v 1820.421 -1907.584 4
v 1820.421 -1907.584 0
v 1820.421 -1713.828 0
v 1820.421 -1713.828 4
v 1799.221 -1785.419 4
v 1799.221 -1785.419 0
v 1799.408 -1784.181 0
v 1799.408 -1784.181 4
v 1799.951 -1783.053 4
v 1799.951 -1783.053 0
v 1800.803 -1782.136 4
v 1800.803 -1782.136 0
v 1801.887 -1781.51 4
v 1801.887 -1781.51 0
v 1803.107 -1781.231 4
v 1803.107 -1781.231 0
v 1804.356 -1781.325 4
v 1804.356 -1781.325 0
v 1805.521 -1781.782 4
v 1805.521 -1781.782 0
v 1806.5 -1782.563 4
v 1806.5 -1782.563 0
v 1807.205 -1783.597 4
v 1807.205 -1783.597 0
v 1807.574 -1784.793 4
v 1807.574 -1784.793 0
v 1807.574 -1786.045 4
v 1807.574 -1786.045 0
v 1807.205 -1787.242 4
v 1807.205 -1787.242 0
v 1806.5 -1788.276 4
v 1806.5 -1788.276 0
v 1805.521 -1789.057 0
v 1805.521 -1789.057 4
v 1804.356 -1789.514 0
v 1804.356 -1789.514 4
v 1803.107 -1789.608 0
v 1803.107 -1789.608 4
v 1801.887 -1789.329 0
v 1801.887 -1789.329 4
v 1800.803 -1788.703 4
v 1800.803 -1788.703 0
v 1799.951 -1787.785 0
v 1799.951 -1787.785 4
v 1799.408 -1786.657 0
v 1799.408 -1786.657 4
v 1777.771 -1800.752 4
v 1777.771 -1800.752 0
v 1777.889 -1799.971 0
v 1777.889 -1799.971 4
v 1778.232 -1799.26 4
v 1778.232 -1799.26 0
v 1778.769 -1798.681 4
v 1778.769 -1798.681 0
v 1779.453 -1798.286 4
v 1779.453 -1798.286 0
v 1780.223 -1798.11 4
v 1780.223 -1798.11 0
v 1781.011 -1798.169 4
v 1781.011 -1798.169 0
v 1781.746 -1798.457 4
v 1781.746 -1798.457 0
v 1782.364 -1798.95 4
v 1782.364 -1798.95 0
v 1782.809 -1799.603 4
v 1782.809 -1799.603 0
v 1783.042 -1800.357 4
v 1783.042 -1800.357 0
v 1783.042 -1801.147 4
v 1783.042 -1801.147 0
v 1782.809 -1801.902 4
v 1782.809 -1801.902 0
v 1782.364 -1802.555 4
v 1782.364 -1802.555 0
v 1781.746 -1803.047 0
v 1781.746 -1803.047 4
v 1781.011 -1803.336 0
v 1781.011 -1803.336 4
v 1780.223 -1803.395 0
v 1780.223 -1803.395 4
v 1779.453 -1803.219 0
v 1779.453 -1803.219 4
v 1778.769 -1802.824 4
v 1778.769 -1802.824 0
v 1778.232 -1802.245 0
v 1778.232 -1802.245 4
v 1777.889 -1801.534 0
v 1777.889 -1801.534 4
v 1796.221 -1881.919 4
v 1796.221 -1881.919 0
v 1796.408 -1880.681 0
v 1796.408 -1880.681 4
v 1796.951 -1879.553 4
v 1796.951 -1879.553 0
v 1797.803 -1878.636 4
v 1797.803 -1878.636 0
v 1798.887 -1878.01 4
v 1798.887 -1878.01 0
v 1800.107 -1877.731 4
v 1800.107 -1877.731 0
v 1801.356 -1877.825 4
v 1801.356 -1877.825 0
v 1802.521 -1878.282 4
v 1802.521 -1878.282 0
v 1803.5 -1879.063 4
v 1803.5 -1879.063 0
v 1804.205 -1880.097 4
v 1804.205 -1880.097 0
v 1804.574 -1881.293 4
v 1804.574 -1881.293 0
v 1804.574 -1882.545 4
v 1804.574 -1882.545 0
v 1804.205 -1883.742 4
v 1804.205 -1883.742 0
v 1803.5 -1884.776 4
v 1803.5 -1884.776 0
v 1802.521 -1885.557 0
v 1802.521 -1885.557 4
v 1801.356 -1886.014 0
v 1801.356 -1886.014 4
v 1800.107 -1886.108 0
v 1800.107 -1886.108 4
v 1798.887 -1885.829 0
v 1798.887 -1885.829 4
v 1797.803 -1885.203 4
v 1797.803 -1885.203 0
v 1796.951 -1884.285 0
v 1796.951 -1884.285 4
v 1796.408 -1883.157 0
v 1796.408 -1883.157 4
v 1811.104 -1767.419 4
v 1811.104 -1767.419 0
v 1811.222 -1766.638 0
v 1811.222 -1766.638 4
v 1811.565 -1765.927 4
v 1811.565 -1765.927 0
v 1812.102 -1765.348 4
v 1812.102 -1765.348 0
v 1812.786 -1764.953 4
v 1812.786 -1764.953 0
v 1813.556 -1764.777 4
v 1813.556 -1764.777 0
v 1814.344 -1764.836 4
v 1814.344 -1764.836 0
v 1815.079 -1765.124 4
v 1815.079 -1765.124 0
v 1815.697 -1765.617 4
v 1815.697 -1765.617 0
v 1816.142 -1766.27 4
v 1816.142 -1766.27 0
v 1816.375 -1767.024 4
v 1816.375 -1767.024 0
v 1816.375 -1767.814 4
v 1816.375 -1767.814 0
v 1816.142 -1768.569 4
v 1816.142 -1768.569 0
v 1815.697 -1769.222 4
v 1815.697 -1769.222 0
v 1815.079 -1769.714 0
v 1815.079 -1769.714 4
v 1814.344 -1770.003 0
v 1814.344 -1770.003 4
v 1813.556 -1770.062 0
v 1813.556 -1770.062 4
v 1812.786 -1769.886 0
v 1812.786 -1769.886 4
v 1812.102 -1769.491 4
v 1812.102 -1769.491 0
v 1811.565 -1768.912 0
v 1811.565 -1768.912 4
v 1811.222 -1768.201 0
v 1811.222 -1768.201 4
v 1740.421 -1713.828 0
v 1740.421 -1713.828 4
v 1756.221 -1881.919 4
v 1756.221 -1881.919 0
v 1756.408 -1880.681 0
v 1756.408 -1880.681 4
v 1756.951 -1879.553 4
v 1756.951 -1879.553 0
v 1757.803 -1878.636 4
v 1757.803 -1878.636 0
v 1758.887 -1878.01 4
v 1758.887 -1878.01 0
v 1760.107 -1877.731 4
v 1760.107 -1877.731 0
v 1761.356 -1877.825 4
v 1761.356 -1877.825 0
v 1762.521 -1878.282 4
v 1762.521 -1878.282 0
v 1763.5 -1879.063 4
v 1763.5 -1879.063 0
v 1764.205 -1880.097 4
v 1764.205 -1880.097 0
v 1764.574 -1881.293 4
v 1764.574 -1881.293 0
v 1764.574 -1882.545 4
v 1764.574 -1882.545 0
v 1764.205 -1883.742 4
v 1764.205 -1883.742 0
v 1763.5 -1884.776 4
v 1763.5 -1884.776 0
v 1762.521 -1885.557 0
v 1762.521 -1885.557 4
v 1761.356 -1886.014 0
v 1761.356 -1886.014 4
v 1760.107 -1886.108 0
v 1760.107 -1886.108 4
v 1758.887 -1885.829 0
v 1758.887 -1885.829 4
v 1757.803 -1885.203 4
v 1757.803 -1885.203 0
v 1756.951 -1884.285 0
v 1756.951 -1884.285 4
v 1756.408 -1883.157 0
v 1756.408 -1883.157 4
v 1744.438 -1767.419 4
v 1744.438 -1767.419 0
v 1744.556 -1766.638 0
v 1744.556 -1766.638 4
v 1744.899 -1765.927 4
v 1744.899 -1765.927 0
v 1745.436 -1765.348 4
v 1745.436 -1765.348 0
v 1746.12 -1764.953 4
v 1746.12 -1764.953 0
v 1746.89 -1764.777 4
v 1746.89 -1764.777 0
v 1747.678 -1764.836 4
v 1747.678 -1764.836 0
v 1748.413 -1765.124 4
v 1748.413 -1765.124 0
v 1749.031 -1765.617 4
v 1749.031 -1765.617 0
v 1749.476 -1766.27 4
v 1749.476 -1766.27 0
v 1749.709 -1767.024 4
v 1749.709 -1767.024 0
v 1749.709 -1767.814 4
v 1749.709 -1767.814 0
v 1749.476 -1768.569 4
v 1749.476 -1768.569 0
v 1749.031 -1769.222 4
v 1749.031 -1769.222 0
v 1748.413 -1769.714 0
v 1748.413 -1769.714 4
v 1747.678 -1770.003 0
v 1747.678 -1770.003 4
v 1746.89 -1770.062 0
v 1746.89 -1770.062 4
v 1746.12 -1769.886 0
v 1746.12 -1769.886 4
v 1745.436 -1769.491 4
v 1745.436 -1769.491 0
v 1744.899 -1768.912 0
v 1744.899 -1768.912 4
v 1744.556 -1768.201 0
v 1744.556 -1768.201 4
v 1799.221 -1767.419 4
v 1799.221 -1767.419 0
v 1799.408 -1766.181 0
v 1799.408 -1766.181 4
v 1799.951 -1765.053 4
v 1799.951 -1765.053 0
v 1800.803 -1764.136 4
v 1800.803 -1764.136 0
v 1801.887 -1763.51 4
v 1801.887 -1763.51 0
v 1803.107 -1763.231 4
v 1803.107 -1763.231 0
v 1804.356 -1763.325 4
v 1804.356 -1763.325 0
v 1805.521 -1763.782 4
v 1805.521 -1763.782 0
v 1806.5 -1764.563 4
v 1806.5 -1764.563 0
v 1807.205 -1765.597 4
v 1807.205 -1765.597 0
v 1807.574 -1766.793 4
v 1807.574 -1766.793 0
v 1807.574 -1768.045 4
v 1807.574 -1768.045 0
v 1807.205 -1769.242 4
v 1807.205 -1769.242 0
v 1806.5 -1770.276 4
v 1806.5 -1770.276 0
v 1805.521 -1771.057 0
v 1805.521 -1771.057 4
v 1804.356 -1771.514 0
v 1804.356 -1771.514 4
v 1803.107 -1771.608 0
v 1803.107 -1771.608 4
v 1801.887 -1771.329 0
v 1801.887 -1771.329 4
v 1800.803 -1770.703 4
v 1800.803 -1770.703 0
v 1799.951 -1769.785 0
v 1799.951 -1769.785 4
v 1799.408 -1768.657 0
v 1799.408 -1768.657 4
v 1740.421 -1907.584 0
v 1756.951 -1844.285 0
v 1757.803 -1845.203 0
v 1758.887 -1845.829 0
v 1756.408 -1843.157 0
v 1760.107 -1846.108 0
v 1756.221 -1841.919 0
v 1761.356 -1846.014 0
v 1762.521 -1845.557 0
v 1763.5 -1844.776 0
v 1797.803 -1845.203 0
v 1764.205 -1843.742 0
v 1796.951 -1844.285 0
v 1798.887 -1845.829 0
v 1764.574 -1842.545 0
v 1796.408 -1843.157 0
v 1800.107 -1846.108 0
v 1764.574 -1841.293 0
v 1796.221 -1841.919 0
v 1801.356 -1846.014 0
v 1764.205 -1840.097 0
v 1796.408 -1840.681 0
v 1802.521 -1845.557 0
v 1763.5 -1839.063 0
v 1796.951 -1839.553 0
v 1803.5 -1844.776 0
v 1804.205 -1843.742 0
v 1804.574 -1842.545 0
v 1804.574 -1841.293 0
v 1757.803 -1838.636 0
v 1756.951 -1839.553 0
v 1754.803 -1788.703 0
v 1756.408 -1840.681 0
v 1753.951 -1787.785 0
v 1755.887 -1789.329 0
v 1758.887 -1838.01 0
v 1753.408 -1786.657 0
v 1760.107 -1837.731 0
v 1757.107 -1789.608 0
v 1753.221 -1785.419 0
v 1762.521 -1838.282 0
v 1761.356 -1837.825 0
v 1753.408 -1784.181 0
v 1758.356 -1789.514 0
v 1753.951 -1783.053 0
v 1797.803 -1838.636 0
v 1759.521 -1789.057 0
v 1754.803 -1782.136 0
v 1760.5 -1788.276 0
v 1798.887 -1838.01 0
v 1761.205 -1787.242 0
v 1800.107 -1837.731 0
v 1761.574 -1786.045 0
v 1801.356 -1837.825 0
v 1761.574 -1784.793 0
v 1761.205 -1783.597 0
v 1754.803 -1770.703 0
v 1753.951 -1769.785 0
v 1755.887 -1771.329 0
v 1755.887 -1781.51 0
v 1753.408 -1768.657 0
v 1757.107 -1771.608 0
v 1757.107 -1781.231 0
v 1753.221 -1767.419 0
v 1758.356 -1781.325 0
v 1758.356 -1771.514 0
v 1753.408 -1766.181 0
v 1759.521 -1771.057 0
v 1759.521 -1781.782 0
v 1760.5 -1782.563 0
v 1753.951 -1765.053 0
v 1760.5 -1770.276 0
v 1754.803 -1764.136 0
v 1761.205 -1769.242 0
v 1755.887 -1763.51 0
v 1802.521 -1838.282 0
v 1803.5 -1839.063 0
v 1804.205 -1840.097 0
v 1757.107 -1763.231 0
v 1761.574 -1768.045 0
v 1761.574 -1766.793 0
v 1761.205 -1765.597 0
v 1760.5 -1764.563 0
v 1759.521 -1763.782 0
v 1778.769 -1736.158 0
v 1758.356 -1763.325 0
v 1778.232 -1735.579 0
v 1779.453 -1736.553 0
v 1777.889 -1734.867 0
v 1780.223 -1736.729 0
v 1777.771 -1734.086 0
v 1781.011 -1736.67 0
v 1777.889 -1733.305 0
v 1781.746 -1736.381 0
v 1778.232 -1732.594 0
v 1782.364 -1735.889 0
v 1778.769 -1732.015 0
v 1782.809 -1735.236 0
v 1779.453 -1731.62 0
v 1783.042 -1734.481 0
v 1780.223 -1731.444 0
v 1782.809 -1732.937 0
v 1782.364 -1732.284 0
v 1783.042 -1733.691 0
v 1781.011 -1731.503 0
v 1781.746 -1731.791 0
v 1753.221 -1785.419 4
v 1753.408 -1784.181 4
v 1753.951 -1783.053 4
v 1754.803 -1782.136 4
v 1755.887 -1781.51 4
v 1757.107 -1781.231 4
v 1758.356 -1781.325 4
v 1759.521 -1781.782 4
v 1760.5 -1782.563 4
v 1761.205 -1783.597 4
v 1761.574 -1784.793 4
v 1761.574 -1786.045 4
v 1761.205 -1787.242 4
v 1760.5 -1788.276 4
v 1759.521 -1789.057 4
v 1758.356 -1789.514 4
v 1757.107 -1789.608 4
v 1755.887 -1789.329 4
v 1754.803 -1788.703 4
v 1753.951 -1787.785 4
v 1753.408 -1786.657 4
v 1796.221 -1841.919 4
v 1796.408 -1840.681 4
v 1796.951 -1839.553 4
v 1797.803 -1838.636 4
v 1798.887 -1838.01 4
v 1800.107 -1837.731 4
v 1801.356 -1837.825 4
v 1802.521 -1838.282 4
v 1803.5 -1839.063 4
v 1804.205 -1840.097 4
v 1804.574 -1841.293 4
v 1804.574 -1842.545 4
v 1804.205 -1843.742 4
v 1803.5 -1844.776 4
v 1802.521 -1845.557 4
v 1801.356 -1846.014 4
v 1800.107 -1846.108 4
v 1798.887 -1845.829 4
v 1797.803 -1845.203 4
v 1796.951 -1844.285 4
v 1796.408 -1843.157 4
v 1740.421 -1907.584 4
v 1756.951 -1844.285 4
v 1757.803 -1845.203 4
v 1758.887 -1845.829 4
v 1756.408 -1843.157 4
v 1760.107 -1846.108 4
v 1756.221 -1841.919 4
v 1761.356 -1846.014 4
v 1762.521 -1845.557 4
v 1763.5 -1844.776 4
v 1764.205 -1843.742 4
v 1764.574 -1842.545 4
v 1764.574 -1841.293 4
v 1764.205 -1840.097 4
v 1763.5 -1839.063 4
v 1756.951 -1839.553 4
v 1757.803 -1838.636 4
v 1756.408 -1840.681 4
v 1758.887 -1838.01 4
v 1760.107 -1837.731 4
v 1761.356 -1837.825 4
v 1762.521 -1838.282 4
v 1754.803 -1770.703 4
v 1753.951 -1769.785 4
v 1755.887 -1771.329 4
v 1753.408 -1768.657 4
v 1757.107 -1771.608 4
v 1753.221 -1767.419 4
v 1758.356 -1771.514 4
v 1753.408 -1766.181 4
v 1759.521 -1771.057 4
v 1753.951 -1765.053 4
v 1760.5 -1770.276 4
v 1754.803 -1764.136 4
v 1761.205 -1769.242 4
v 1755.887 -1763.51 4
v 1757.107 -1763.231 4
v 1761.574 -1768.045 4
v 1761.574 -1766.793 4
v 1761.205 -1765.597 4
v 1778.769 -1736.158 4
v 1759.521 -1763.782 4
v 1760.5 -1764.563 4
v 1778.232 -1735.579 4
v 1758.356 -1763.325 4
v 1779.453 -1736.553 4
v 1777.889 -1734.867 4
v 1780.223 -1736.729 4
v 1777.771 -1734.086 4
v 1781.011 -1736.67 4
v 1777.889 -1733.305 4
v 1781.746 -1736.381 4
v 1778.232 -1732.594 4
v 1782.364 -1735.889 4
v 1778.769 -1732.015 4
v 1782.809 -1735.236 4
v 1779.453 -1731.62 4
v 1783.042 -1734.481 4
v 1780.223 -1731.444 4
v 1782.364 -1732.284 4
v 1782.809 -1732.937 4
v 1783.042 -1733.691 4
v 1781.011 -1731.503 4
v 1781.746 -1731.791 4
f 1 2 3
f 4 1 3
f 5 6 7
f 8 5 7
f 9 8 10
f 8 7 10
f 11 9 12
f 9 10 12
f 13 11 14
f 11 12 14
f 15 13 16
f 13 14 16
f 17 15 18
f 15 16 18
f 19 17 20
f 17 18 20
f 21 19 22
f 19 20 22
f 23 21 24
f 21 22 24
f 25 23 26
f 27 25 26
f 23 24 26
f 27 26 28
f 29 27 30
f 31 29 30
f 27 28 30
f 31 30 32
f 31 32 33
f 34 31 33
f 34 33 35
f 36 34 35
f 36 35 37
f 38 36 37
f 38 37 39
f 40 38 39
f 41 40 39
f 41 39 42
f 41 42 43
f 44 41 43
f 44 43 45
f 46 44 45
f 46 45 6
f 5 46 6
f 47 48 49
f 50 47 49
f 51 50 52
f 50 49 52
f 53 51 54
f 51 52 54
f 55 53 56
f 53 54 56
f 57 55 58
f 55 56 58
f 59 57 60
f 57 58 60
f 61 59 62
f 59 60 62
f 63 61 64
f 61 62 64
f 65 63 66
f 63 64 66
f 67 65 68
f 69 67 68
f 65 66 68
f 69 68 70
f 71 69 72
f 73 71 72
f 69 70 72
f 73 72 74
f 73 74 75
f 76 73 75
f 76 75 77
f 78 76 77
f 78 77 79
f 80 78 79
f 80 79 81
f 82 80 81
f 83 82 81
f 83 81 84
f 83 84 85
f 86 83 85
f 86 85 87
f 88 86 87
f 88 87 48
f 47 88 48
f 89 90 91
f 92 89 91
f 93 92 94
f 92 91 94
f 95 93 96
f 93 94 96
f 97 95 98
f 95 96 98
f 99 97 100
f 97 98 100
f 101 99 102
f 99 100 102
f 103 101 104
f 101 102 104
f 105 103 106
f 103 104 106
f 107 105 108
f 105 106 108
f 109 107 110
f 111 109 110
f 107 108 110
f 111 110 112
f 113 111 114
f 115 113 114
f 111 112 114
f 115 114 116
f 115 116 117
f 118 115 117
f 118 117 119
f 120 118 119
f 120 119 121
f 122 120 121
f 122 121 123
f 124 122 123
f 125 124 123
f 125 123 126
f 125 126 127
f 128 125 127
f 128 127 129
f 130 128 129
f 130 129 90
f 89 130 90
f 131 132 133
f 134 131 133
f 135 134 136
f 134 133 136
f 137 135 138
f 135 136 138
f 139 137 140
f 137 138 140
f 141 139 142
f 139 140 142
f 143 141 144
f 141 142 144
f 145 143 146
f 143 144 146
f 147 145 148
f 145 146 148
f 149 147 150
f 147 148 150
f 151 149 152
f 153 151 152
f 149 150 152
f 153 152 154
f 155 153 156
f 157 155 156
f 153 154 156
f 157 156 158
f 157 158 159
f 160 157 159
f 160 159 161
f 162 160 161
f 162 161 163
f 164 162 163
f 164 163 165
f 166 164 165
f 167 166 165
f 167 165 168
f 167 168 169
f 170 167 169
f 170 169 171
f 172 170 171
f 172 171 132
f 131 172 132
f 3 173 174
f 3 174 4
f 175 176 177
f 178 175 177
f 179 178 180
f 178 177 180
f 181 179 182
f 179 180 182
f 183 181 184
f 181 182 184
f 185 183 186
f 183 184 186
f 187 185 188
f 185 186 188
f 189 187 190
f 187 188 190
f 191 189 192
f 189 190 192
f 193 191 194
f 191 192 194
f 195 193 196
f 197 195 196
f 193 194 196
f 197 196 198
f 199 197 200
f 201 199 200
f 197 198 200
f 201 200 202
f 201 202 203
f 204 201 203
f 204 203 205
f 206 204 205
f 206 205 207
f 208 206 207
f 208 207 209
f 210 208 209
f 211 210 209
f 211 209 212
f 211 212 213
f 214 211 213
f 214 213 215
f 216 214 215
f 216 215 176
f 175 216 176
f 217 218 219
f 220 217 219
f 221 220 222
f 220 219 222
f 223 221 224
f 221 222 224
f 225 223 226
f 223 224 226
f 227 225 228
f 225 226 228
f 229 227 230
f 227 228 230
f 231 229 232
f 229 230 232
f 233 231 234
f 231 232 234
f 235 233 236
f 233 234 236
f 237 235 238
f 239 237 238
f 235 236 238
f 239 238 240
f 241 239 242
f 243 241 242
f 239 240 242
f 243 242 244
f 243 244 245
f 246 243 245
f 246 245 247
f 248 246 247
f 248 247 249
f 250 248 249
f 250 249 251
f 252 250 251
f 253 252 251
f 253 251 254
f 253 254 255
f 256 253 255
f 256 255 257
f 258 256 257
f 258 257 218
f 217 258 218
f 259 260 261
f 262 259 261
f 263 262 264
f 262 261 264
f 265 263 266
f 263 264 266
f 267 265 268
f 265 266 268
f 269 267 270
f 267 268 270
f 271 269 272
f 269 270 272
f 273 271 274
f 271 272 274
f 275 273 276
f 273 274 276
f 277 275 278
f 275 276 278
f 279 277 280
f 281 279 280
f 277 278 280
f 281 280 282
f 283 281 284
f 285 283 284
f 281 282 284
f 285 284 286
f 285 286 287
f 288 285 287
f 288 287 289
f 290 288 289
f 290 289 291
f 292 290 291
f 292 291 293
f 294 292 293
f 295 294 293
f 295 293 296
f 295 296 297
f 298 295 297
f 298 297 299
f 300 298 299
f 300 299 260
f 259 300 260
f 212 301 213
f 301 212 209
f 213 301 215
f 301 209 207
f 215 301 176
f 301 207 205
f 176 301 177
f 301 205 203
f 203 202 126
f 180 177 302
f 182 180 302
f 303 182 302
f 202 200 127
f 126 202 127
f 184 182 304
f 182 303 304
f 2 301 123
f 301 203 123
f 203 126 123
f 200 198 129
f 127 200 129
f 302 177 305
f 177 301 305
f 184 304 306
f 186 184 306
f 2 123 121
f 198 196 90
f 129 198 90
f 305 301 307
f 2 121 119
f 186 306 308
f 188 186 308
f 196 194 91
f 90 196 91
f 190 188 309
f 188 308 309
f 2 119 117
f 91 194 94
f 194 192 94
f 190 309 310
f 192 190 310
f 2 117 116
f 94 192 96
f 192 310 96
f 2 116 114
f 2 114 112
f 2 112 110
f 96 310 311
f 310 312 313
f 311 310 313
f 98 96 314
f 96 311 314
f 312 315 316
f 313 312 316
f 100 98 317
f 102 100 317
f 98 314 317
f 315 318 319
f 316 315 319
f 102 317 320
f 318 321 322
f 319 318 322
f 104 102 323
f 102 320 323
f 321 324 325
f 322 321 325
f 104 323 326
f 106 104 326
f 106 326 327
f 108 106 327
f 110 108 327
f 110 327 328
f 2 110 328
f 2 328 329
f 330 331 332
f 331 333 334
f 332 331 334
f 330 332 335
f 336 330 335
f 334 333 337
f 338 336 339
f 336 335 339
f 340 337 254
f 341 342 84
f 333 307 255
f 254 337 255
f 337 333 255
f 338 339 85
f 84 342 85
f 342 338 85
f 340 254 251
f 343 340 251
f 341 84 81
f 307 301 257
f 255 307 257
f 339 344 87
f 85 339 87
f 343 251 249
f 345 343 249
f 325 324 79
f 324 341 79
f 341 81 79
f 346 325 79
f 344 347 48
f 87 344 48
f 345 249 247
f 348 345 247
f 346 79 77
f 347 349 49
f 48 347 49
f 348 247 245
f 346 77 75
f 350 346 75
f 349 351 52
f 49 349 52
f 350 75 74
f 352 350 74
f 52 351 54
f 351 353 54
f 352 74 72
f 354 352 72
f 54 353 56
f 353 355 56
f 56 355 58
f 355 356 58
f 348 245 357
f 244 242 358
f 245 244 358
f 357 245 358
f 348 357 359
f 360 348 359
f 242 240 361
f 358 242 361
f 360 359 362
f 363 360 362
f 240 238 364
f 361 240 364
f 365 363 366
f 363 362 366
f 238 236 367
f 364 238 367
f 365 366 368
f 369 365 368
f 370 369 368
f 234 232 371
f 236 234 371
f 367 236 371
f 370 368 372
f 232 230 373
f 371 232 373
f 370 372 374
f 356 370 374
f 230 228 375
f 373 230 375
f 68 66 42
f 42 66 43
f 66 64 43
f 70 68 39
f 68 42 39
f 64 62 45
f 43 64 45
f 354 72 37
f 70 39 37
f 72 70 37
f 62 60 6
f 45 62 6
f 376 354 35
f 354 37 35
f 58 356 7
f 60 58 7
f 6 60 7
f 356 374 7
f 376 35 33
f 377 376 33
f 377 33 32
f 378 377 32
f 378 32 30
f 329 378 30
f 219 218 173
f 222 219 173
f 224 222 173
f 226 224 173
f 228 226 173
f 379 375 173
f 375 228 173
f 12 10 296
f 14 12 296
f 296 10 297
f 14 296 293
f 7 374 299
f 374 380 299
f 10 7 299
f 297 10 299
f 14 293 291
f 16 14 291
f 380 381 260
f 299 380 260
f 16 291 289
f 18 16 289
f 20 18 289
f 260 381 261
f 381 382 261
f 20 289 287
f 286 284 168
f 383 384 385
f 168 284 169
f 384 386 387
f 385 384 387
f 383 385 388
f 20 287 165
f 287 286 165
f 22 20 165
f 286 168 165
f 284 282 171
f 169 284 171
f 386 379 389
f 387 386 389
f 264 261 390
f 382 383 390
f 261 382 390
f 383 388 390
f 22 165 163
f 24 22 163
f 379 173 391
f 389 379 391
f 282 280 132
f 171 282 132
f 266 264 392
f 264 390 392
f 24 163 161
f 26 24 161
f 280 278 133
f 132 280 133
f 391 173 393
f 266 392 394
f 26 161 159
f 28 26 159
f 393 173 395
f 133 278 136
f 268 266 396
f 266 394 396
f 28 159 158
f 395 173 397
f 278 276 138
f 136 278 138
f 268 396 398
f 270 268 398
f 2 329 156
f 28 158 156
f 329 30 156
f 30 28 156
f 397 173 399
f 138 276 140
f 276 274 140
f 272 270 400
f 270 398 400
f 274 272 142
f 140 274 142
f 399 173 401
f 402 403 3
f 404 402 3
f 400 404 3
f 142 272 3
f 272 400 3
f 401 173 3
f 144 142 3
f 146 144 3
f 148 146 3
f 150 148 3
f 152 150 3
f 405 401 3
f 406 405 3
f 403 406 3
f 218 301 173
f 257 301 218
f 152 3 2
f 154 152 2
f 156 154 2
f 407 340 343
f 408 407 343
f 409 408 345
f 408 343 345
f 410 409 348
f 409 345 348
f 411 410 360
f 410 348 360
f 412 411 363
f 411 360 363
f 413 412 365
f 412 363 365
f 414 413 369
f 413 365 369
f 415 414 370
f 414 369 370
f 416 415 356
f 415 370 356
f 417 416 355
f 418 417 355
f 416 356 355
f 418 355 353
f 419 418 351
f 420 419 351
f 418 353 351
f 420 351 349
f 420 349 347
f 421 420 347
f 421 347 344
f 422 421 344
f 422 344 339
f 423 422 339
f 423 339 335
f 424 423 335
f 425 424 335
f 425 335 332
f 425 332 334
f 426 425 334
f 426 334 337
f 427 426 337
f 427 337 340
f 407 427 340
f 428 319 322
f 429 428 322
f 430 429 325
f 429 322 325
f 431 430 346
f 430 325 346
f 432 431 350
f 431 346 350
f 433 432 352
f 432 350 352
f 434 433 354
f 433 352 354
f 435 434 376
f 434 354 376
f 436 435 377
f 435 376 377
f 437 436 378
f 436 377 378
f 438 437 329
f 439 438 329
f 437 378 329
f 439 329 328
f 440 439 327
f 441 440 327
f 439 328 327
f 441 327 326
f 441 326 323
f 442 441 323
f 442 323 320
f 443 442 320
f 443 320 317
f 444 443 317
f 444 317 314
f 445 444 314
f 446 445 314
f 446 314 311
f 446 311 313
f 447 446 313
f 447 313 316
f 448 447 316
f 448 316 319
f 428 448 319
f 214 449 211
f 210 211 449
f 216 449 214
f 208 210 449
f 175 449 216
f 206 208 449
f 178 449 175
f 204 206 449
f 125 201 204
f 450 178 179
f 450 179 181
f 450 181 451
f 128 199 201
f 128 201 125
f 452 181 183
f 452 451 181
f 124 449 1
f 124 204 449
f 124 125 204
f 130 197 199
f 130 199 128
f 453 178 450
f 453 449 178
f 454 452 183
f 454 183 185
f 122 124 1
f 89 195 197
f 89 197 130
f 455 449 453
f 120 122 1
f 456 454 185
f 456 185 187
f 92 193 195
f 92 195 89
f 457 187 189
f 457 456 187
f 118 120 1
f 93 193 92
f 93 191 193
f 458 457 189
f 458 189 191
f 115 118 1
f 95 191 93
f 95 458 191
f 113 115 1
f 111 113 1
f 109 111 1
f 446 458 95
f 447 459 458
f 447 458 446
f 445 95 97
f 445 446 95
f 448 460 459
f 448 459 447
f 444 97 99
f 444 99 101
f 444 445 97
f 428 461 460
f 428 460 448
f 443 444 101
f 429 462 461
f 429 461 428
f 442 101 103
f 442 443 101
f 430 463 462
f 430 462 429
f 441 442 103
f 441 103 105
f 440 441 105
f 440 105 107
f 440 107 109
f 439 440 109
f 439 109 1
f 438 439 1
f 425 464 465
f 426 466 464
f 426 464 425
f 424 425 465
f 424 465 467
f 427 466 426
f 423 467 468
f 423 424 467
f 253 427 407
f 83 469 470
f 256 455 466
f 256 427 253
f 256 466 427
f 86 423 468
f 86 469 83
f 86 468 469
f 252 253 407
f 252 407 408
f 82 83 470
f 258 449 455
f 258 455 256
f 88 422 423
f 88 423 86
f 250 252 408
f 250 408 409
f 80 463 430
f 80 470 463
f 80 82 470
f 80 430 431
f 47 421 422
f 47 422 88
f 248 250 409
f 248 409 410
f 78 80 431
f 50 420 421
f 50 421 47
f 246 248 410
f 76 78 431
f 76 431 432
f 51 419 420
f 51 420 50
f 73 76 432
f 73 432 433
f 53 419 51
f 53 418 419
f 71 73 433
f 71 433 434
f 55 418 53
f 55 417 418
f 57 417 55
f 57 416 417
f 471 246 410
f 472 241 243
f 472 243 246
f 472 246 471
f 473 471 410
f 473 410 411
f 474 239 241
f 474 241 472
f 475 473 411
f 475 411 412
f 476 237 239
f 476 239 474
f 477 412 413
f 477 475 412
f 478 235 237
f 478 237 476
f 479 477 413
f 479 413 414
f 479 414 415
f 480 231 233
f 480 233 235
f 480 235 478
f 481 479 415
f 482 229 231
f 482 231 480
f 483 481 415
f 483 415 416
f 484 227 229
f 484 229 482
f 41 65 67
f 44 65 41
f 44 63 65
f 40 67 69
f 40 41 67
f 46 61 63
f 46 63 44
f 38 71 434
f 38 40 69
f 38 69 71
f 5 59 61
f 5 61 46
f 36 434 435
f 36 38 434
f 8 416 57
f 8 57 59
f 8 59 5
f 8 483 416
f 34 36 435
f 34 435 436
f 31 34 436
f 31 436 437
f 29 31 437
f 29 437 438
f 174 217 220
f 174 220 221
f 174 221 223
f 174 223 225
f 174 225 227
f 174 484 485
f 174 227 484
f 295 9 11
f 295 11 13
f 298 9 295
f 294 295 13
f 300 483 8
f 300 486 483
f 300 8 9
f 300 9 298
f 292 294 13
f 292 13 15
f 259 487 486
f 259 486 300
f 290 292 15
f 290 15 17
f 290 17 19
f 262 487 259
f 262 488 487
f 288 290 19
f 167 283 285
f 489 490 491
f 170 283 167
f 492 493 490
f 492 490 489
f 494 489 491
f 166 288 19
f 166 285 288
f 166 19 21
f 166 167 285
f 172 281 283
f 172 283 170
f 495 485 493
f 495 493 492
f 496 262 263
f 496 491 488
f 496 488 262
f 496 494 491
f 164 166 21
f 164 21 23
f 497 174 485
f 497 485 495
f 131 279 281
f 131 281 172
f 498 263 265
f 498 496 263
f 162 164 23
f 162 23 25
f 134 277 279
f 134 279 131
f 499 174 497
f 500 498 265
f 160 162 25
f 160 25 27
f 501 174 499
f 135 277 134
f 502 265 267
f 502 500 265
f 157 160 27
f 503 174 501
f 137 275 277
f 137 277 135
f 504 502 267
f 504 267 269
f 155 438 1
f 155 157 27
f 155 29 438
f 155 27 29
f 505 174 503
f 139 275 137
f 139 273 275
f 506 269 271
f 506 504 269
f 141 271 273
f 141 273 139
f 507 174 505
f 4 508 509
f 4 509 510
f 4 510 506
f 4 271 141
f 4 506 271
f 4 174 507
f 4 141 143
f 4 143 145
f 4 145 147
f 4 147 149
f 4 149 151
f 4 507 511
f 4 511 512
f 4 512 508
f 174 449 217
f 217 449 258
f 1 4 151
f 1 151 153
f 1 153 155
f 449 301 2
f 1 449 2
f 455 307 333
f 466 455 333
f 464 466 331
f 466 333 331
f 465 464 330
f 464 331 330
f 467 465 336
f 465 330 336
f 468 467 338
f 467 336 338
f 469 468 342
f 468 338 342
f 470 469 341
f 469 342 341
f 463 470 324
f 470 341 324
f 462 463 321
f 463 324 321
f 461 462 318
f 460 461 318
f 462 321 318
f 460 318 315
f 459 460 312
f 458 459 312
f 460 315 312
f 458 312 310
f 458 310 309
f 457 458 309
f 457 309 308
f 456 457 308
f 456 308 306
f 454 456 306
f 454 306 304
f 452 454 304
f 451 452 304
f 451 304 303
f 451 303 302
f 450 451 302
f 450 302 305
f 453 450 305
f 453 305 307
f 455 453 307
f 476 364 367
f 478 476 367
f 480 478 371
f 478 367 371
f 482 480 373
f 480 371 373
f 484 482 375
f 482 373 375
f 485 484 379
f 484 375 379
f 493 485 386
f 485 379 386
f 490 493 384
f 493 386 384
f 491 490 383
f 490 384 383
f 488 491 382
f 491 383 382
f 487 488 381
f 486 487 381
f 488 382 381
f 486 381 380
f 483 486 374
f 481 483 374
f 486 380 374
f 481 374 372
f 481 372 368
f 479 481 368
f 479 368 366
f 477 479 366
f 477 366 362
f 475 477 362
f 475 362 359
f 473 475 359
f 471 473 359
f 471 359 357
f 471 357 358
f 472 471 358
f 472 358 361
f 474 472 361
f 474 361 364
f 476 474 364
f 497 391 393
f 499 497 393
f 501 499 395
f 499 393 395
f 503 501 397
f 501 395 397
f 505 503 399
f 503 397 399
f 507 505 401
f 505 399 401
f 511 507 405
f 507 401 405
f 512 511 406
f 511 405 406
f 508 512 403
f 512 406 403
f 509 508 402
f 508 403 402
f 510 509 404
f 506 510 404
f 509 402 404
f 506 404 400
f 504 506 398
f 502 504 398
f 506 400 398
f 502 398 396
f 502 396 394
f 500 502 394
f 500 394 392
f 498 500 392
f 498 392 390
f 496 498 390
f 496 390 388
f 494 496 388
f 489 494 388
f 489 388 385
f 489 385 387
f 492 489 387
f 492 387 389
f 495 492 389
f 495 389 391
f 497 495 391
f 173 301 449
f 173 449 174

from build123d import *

# Parameters (mm, degrees)
SKETCH1_W            = 80
SKETCH1_H            = 193.756044748
BOSS_EXTRUDE1_DEPTH  = 4
M8_CLEARANCE_HOLE1_D = 8.4
M5_CLEARANCE_HOLE1_D = 5.3


with BuildPart() as part:
    # Sketch1 → Boss-Extrude1 (new body)
    with BuildSketch(Plane.XY):
        with Locations((1780.42117355, -1810.70620503)):
            Rectangle(SKETCH1_W, SKETCH1_H)
    extrude(amount=BOSS_EXTRUDE1_DEPTH)

    # M8 Clearance Hole1 (through all)
    with Locations(Plane.XY.offset(4)):
        with Locations((1757.421173548, -1767.419409116), (1803.421173548, -1767.419409116), (1803.421173548, -1785.419409116), (1757.421173548, -1785.419409116), (1800.42117355, -1841.919409116), (1760.42117355, -1841.919409116), (1800.42117355, -1881.919409116), (1760.42117355, -1881.919409116)):
            Hole(M8_CLEARANCE_HOLE1_D / 2)

    # M5 Clearance Hole1 (through all)
    with Locations(Plane.XY.offset(4)):
        with Locations((1813.754187213, -1767.419409116), (1747.088159883, -1767.419409116), (1780.421173548, -1734.086395451), (1780.421173548, -1800.752422781)):
            Hole(M5_CLEARANCE_HOLE1_D / 2)


solid = part.part
